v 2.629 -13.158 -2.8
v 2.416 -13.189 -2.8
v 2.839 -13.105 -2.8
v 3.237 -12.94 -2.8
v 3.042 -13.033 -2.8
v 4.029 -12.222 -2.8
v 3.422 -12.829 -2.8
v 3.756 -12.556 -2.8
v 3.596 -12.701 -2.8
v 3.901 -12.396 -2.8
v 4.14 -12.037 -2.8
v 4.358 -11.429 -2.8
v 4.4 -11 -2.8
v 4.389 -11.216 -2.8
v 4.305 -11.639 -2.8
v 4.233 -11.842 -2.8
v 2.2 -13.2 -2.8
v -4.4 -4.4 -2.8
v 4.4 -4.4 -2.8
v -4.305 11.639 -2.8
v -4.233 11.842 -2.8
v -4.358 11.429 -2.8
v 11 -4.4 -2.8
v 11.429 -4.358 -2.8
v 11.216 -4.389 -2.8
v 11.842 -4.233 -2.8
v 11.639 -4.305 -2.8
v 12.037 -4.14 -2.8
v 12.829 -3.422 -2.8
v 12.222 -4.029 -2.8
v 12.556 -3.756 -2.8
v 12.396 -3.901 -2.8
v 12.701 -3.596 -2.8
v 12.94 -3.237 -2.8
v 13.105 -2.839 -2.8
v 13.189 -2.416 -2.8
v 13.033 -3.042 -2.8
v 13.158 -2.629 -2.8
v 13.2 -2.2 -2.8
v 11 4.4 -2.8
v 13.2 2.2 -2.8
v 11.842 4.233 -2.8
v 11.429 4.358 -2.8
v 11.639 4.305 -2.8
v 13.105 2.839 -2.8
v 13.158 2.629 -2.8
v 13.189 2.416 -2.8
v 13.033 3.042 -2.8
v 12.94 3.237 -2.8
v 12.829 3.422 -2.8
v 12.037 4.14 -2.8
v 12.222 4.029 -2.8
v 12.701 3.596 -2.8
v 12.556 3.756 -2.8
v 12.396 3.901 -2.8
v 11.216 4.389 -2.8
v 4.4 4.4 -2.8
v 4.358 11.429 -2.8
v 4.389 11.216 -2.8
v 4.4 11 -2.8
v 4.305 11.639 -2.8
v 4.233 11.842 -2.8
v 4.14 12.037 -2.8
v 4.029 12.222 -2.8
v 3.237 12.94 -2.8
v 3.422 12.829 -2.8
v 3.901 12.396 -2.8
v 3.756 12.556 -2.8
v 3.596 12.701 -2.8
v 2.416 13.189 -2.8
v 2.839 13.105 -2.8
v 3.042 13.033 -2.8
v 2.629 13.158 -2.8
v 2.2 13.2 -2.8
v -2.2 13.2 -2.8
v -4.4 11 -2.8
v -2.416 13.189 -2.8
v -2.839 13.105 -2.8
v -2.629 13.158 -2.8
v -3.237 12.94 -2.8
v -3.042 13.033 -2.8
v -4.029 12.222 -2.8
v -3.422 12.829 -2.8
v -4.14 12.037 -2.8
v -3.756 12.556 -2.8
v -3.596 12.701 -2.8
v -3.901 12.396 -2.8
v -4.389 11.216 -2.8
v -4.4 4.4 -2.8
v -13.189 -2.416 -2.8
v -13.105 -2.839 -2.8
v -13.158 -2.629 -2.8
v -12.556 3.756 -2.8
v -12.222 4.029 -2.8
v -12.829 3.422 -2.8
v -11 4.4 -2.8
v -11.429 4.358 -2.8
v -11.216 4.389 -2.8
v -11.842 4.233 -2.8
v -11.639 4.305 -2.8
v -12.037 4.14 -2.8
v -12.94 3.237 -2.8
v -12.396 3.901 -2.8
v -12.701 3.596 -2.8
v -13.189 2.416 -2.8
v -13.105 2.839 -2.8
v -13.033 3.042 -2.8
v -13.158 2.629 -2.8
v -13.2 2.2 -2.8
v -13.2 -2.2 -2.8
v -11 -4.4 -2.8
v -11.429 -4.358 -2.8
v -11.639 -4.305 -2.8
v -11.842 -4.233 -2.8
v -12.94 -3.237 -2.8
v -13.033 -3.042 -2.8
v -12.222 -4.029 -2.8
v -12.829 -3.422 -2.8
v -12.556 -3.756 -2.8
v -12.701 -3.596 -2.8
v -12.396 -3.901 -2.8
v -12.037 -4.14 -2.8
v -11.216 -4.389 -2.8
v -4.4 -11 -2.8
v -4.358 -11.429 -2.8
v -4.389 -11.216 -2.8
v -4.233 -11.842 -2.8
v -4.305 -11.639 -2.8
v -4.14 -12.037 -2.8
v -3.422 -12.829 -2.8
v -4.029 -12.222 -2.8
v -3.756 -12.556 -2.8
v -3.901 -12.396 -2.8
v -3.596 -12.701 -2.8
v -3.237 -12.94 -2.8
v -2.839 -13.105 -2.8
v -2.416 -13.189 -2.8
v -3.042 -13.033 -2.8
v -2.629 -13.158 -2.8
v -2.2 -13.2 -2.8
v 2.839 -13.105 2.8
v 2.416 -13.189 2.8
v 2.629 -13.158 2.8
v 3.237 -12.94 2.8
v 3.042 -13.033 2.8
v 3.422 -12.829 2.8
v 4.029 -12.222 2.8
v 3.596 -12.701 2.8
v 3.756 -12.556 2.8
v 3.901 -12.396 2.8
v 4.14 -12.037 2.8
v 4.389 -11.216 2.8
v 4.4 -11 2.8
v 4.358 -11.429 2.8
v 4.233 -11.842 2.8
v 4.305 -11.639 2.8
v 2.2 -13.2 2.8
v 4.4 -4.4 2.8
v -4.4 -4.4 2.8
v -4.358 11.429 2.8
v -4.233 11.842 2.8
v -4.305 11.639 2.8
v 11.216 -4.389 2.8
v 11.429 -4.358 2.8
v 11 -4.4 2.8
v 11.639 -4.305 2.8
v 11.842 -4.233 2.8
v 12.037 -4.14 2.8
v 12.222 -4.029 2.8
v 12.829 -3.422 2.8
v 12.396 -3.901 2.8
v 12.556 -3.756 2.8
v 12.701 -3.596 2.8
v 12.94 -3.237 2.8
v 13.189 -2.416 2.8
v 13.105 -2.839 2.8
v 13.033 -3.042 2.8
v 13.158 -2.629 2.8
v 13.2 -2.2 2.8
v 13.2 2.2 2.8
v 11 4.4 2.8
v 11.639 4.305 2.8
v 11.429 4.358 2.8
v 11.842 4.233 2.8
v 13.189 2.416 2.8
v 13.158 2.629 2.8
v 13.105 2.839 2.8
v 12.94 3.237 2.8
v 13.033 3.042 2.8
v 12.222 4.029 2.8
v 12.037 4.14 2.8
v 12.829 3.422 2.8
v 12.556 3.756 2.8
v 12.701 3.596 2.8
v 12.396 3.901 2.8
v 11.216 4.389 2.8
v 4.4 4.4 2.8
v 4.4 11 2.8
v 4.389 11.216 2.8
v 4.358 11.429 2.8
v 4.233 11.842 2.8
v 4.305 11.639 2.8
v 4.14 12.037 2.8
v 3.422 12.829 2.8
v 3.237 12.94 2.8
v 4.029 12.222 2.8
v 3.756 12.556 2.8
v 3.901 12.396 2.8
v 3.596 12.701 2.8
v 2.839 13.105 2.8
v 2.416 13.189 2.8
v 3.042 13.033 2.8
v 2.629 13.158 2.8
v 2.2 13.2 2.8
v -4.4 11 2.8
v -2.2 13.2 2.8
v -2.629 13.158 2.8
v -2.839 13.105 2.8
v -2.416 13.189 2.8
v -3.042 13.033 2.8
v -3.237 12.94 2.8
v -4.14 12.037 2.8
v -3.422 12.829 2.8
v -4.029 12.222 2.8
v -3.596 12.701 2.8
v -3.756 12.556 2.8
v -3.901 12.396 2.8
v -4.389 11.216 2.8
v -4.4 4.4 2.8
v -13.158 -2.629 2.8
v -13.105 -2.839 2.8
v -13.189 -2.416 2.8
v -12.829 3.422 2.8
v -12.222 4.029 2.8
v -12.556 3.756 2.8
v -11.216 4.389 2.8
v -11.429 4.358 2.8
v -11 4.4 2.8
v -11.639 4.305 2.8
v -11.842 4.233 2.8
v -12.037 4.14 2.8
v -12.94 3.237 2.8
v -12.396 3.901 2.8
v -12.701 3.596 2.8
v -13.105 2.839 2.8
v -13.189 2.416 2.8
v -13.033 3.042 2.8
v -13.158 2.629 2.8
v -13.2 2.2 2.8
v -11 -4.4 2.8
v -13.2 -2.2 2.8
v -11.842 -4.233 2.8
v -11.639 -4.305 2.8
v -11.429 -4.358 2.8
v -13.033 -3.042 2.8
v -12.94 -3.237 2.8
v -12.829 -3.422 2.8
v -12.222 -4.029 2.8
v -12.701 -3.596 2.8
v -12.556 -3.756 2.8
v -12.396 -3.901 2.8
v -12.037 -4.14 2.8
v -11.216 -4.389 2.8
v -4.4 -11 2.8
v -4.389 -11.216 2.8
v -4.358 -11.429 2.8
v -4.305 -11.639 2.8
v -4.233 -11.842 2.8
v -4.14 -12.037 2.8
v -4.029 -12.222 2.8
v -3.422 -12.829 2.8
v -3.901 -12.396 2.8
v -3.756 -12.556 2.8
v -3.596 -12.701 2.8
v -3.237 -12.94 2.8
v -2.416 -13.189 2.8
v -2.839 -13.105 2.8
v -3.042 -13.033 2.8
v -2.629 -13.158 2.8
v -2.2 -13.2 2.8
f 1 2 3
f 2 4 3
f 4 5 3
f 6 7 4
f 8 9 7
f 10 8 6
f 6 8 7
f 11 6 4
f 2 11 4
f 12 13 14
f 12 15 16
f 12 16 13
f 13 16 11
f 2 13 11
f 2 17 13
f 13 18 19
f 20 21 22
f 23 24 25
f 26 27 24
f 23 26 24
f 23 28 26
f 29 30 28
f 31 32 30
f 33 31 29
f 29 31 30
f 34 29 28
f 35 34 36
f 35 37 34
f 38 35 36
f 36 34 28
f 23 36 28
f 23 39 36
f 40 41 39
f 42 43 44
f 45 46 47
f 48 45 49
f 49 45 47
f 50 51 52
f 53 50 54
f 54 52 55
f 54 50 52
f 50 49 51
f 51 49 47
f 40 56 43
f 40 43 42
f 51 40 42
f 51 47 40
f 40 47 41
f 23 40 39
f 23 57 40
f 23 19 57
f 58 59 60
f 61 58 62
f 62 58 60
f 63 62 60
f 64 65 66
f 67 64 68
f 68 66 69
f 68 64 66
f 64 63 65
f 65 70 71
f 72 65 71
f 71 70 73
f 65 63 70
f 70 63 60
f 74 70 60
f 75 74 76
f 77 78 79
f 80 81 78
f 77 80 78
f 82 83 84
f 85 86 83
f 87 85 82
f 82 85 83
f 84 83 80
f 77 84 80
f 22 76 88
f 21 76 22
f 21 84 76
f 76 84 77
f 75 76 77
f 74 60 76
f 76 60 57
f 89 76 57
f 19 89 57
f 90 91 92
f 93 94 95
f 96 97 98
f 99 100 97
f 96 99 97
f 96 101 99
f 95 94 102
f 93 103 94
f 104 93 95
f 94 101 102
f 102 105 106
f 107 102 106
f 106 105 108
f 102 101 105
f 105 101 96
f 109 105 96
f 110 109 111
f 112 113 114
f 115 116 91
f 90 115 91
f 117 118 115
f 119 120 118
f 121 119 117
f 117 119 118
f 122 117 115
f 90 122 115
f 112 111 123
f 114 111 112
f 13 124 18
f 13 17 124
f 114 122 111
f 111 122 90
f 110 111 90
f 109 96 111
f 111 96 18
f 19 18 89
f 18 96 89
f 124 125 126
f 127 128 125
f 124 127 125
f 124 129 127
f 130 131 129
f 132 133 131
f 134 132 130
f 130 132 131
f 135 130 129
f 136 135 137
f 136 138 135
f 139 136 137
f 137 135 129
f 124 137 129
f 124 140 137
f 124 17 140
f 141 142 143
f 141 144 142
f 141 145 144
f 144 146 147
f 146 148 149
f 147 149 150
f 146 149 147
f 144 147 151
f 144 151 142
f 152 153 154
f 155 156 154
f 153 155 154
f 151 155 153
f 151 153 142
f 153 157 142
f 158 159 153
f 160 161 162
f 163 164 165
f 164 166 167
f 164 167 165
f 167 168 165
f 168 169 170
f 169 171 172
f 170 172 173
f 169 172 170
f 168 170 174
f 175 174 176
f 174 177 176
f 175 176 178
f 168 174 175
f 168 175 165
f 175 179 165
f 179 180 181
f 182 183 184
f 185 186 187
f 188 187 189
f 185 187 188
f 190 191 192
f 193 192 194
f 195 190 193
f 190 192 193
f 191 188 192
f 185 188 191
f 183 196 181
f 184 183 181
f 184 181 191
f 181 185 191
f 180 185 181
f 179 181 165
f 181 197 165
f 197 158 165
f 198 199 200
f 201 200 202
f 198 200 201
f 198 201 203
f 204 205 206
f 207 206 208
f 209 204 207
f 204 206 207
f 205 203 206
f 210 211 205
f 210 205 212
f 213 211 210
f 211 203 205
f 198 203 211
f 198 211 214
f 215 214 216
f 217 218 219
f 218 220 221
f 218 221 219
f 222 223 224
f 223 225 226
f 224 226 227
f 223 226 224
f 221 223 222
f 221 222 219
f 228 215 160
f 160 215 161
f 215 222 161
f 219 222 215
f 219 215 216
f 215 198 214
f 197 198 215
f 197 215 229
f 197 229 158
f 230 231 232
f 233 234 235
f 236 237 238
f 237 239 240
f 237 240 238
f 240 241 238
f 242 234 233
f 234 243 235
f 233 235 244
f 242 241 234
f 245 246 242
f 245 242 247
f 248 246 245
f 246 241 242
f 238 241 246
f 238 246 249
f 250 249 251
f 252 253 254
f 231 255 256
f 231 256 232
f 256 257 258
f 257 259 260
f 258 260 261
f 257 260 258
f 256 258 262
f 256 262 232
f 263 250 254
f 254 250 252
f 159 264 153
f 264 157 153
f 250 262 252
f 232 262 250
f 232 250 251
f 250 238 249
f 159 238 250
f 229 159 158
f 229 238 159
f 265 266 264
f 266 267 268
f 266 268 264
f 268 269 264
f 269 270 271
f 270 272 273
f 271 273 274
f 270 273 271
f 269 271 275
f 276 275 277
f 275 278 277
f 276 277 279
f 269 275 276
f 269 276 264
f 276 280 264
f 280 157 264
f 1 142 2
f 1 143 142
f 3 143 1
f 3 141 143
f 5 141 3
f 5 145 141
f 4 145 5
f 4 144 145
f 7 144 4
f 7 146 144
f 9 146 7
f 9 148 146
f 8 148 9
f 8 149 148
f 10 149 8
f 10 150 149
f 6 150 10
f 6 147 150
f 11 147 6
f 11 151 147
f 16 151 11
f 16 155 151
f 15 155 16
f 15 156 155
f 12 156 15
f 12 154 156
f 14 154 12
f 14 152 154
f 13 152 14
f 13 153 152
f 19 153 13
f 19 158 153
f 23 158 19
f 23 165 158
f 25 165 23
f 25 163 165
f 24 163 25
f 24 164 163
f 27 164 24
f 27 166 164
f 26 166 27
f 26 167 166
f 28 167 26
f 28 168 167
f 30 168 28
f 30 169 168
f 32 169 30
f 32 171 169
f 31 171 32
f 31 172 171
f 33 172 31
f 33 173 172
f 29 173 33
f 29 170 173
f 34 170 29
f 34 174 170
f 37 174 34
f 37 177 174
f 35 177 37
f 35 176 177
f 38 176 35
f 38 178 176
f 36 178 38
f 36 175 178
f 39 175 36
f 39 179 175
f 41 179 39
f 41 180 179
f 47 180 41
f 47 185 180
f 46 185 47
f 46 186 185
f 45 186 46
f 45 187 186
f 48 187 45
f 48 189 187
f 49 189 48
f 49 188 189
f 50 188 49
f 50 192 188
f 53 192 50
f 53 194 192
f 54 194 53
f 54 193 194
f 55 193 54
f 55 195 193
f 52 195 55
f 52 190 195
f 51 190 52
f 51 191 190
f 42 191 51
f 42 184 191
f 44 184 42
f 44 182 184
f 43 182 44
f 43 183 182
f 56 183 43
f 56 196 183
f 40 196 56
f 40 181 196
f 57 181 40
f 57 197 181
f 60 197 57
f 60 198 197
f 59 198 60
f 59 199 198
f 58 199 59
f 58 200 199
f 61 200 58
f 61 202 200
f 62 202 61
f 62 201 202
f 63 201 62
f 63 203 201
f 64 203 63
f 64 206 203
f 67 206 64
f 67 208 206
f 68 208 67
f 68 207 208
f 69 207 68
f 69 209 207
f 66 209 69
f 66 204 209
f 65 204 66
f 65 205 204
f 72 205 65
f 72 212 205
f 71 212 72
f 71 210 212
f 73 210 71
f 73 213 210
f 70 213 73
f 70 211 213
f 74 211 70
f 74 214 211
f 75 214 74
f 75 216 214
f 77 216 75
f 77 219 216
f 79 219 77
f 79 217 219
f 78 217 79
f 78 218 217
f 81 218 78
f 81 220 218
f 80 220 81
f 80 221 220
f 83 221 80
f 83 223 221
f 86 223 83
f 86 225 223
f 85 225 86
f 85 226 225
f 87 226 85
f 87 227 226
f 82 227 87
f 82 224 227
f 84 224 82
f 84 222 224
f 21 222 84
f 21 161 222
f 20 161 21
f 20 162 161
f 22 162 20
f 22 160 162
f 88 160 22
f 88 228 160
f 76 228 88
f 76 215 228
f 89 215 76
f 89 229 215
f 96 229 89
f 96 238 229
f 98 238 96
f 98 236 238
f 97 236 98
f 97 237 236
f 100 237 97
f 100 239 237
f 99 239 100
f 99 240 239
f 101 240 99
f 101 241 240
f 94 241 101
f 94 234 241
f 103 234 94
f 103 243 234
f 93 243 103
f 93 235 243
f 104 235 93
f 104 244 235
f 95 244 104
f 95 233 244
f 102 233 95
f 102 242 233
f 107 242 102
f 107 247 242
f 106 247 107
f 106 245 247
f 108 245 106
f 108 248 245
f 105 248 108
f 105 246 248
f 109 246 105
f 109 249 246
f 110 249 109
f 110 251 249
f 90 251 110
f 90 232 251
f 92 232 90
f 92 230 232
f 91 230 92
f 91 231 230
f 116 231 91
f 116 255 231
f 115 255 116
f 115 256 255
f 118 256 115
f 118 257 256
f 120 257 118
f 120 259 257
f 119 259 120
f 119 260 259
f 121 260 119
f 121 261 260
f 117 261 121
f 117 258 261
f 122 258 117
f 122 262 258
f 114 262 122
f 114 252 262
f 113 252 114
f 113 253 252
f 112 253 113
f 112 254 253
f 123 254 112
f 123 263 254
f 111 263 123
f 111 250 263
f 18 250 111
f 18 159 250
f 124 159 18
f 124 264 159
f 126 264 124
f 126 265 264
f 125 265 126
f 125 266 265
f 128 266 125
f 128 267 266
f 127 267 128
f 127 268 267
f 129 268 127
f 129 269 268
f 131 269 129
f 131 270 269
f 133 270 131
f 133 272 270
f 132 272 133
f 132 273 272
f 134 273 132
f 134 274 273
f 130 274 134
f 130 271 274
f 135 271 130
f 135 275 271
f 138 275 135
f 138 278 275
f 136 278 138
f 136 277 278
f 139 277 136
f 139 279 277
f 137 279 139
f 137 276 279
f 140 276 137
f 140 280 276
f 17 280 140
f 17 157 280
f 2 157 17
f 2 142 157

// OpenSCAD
$fn=64;

size_xy = 26.4;
thickness = 5.6;

arm_w = 8.8;
core_w = 8.8;
corner_r = 2.2;

module rounded_rect_2d(w, h, r){
    r2 = min(r, min(w,h)/2);
    hull(){
        translate([ w/2 - r2,  h/2 - r2]) circle(r=r2);
        translate([-w/2 + r2,  h/2 - r2]) circle(r=r2);
        translate([ w/2 - r2, -h/2 + r2]) circle(r=r2);
        translate([-w/2 + r2, -h/2 + r2]) circle(r=r2);
    }
}

module cross_2d(arm_len, arm_w, r){
    union(){
        rounded_rect_2d(arm_len, arm_w, r);
        rounded_rect_2d(arm_w, arm_len, r);
    }
}

module cross_block(){
    linear_extrude(height=thickness, center=true, convexity=10)
        cross_2d(size_xy, arm_w, corner_r);
}

cross_block();
